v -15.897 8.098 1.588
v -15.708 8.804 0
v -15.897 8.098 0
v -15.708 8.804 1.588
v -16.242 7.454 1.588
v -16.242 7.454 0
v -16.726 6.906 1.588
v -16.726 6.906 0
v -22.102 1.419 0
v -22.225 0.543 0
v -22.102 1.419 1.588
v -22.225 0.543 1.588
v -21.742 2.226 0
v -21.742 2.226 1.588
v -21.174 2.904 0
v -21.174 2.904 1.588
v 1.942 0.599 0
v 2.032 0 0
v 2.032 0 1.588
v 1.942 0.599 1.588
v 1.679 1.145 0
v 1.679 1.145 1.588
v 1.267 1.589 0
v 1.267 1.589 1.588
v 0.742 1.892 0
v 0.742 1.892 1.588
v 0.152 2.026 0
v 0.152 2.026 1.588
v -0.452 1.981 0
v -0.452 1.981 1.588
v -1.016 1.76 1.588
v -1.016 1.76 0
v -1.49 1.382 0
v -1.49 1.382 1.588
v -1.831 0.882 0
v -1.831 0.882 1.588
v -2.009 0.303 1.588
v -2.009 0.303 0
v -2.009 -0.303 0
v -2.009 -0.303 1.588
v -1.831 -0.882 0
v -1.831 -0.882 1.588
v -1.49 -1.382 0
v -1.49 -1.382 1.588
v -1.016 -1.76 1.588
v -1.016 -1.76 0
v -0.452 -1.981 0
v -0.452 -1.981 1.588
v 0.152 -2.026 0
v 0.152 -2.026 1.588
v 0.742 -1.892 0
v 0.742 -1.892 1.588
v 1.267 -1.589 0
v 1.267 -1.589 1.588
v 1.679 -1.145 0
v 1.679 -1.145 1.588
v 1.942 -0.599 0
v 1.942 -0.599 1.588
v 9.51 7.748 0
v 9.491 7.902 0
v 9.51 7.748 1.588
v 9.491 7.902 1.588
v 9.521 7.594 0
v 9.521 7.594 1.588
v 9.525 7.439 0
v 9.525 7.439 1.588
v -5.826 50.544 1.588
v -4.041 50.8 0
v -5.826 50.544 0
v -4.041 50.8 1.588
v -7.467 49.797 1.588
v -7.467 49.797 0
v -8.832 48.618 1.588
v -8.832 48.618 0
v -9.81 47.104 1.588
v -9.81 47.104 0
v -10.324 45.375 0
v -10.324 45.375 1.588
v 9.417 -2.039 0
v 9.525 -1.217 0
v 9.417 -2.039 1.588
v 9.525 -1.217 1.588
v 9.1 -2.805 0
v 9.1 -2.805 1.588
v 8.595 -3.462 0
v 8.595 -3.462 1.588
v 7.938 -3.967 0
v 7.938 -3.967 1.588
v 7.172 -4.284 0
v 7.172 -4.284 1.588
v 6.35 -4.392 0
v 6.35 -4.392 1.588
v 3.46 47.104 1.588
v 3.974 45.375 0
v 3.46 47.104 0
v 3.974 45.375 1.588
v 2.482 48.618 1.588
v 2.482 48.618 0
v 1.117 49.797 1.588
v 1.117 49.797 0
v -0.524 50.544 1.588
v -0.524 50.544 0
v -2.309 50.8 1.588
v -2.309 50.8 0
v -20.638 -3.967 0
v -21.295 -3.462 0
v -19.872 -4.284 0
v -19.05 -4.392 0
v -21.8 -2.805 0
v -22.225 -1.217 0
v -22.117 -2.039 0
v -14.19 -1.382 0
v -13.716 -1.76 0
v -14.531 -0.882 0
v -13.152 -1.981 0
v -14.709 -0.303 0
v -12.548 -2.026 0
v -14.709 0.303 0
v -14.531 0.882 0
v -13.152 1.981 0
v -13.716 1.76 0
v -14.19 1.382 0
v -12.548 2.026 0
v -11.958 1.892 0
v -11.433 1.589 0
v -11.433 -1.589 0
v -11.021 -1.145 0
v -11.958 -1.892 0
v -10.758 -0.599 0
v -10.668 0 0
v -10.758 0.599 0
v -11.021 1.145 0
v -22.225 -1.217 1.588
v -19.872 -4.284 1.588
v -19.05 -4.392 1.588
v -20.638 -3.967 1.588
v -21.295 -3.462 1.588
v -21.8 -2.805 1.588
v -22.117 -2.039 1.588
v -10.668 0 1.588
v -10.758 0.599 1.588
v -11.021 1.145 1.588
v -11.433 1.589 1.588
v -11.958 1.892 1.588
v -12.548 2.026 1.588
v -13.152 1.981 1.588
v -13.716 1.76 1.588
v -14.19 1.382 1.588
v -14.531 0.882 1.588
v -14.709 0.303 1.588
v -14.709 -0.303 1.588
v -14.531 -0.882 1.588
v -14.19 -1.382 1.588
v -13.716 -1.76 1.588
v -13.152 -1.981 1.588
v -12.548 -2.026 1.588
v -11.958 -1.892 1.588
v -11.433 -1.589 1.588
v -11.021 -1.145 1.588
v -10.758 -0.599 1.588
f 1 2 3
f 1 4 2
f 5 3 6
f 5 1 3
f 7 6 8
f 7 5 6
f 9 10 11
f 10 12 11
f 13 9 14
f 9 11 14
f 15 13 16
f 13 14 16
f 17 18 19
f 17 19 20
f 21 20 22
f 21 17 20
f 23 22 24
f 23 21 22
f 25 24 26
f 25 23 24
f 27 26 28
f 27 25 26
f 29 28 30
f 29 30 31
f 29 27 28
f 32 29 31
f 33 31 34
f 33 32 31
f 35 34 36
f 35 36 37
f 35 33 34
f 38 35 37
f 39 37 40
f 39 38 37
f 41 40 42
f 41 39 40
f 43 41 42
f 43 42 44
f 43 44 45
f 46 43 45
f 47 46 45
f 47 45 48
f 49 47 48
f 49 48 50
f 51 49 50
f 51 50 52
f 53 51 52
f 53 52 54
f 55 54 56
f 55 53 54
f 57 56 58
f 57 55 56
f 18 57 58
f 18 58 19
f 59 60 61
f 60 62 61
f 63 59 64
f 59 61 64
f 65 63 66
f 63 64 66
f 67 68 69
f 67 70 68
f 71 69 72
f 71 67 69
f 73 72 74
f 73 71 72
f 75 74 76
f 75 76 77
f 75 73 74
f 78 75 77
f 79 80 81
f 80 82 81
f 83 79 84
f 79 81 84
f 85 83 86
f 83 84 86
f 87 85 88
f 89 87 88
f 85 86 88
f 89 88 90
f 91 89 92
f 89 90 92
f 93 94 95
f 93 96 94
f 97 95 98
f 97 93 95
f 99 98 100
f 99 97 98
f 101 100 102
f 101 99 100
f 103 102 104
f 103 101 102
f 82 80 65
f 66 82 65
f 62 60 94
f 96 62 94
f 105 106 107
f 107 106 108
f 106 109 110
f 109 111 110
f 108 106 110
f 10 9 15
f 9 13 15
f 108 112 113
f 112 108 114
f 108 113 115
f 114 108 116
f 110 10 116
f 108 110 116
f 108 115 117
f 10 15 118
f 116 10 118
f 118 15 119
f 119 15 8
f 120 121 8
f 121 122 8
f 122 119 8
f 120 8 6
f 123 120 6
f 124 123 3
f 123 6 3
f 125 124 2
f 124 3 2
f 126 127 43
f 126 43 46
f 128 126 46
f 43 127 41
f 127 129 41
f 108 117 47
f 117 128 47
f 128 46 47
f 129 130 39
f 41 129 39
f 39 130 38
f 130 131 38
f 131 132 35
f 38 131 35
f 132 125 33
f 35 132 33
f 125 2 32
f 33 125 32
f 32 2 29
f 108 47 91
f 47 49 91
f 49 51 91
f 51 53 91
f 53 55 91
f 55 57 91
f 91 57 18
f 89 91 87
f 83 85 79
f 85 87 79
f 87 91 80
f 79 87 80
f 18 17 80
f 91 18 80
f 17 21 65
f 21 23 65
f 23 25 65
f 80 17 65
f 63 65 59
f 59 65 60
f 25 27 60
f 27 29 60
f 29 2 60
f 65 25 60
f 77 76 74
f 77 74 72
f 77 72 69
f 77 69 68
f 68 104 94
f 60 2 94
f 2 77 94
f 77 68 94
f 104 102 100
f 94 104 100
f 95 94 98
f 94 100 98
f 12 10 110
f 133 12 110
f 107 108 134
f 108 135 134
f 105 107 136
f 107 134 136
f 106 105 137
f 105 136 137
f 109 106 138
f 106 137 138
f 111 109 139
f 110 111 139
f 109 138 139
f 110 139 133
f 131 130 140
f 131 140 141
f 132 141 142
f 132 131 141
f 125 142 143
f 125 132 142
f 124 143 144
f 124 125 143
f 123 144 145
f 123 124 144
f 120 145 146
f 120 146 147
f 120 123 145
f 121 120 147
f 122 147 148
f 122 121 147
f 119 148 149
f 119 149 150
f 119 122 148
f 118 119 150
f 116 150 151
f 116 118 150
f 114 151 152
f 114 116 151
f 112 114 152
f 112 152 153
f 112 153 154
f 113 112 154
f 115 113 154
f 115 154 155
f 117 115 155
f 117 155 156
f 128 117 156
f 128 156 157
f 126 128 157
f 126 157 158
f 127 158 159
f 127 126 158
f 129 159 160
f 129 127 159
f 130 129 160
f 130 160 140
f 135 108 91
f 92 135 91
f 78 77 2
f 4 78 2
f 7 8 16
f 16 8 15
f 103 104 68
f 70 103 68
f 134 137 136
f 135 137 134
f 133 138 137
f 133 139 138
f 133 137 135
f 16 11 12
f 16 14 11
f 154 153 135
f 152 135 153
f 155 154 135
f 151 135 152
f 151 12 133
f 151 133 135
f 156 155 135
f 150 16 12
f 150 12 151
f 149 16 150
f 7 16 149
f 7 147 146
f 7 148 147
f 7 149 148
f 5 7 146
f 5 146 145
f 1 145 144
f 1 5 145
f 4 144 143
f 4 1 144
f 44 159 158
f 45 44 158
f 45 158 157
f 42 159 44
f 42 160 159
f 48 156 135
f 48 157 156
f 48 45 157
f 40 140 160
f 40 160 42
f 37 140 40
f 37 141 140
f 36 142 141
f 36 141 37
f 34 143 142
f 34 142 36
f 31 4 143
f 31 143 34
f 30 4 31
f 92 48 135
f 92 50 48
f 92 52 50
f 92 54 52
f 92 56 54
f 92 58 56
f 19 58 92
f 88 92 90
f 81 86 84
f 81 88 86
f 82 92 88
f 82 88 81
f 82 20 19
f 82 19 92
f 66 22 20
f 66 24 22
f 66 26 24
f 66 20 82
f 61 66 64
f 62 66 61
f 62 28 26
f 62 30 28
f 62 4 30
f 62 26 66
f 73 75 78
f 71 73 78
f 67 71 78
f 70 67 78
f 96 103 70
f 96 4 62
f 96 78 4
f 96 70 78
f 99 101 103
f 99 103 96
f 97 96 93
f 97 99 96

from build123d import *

# Parameters (mm, degrees)
SKETCH1_R           = 2.032
BOSS_EXTRUDE1_DEPTH = 1.5875
FILLET1_R           = 6.35
FILLET2_R           = 3.175


with BuildPart() as part:
    # Sketch1 → Boss-Extrude1 (new body)
    with BuildSketch(Plane.XY):
        Polygon((9.525, -4.392368296), (9.525, 7.671504431), (3.175, 50.8), (-9.525, 50.8), (-15.875, 7.671504431), (-22.225, 1.957631704), (-22.225, -4.392368296), align=None)
        Circle(SKETCH1_R, mode=Mode.SUBTRACT)
        with Locations((-12.7, 0)):
            Circle(SKETCH1_R, mode=Mode.SUBTRACT)
    extrude(amount=BOSS_EXTRUDE1_DEPTH)

    # Fillet1
    fillet1_edges = [part.edges().sort_by_distance(p)[0] for p in [
        (-9.525, 50.8, 0.79375),
        (3.175, 50.8, 0.79375),
    ]]
    fillet(fillet1_edges, radius=FILLET1_R)

    # Fillet2
    fillet2_edges = [part.edges().sort_by_distance(p)[0] for p in [
        (-22.225, -4.392368296, 0.79375),
        (-22.225, 1.957631704, 0.79375),
        (-15.875, 7.671504431, 0.79375),
        (9.525, 7.671504431, 0.79375),
        (9.525, -4.392368296, 0.79375),
    ]]
    fillet(fillet2_edges, radius=FILLET2_R)


solid = part.part
